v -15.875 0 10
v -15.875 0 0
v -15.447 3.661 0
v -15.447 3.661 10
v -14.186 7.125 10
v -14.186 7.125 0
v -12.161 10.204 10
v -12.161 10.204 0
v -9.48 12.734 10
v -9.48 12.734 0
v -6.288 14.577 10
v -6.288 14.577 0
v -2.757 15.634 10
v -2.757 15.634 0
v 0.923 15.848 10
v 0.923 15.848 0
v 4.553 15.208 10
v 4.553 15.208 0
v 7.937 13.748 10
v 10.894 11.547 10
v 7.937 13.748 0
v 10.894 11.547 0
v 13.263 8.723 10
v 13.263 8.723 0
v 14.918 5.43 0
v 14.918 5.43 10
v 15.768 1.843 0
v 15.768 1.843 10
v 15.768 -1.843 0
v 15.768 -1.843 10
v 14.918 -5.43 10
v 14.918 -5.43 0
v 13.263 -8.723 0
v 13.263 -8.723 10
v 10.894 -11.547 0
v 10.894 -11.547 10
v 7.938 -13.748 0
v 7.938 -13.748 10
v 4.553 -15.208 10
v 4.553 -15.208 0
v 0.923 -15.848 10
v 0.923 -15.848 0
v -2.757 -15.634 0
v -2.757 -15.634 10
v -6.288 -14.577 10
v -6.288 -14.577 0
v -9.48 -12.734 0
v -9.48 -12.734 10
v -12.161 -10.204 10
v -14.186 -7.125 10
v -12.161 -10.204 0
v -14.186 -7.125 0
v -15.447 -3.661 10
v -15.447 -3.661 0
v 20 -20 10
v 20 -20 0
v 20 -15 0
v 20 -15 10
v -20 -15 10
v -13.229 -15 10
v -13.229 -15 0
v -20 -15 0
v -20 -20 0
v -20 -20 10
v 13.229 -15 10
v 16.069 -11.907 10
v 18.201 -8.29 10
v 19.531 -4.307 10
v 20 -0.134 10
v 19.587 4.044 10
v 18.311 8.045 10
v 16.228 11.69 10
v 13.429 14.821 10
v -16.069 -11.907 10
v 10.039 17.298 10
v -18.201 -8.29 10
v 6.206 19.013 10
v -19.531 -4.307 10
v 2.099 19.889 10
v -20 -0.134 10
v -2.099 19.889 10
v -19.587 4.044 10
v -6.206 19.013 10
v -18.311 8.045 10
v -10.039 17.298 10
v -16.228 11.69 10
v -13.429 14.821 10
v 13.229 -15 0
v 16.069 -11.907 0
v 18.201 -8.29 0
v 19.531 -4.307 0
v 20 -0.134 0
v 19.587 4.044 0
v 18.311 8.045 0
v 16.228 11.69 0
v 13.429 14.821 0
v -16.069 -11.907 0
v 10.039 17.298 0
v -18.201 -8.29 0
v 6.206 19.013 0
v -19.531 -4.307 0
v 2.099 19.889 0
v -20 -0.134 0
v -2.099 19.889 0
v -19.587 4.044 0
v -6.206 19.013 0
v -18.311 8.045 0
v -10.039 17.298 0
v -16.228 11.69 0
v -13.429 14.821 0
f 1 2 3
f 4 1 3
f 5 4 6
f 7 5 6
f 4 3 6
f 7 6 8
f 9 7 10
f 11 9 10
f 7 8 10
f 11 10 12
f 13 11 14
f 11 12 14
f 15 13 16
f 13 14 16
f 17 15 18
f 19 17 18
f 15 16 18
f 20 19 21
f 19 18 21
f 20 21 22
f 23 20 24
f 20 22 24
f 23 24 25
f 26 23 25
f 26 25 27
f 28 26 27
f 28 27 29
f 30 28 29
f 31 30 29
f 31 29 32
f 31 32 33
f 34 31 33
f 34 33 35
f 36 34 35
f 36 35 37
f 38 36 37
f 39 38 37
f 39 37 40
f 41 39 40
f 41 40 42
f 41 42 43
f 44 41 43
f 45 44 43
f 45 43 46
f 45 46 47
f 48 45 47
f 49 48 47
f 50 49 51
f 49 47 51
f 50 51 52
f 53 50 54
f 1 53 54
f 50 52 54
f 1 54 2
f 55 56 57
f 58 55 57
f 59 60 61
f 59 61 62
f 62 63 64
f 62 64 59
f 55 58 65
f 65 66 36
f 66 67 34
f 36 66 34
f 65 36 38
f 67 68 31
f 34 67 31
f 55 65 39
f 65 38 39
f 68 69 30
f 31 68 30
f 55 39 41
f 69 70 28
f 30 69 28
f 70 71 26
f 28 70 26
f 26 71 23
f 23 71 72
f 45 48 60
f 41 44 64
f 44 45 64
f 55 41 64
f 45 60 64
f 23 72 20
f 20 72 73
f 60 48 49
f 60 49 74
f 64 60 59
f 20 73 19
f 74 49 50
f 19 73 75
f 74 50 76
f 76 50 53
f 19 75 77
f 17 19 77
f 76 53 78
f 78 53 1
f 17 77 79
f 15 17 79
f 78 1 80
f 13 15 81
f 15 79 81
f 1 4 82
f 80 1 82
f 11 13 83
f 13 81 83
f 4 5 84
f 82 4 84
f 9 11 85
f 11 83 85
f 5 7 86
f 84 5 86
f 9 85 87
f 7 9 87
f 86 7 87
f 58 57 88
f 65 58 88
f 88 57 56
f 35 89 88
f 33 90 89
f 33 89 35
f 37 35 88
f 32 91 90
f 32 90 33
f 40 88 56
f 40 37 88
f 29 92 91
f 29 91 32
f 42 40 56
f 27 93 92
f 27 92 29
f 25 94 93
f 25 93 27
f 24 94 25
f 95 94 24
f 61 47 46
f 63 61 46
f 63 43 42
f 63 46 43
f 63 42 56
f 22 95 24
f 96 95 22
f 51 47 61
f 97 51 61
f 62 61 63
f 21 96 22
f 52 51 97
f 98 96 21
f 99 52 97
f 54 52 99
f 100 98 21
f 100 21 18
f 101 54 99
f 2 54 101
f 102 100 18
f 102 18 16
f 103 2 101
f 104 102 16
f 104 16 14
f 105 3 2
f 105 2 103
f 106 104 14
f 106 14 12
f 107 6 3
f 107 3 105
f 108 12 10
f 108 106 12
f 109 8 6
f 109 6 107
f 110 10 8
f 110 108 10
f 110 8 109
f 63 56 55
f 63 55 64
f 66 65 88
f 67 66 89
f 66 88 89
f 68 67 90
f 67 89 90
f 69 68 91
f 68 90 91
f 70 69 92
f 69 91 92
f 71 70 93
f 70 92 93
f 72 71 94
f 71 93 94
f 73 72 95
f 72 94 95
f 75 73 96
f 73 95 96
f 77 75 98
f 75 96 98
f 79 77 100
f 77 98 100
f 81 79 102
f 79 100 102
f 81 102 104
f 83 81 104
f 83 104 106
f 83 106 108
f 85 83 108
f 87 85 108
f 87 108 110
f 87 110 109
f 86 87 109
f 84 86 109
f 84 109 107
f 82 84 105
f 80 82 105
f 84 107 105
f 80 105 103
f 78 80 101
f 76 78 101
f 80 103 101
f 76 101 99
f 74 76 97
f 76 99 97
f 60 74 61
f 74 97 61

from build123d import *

# Parameters (mm, degrees)
SKETCH1_R           = 20
BOSS_EXTRUDE1_DEPTH = 10
SKETCH2_W           = 40
SKETCH2_H           = 5
BOSS_EXTRUDE2_DEPTH = 10
SKETCH3_R           = 15.875
CUT_EXTRUDE1_DEPTH  = 31


with BuildPart() as part:
    # Sketch1 → Boss-Extrude1 (new body)
    with BuildSketch(Plane.XY):
        Circle(SKETCH1_R)
    extrude(amount=BOSS_EXTRUDE1_DEPTH)

    # Sketch2 → Boss-Extrude2 (add)
    with BuildSketch(Plane(origin=(0, 0, 0), x_dir=(-1, 0, 0), z_dir=(0, 0, -1))):
        with Locations((0, -17.5)):
            Rectangle(SKETCH2_W, SKETCH2_H)
    extrude(amount=-BOSS_EXTRUDE2_DEPTH)

    # Sketch3 → Cut-Extrude1 (cut, through all)
    with BuildSketch(Plane(origin=(0, 0, 0), x_dir=(-1, 0, 0), z_dir=(0, 0, -1))):
        Circle(SKETCH3_R)
    extrude(amount=-CUT_EXTRUDE1_DEPTH, mode=Mode.SUBTRACT)


solid = part.part
